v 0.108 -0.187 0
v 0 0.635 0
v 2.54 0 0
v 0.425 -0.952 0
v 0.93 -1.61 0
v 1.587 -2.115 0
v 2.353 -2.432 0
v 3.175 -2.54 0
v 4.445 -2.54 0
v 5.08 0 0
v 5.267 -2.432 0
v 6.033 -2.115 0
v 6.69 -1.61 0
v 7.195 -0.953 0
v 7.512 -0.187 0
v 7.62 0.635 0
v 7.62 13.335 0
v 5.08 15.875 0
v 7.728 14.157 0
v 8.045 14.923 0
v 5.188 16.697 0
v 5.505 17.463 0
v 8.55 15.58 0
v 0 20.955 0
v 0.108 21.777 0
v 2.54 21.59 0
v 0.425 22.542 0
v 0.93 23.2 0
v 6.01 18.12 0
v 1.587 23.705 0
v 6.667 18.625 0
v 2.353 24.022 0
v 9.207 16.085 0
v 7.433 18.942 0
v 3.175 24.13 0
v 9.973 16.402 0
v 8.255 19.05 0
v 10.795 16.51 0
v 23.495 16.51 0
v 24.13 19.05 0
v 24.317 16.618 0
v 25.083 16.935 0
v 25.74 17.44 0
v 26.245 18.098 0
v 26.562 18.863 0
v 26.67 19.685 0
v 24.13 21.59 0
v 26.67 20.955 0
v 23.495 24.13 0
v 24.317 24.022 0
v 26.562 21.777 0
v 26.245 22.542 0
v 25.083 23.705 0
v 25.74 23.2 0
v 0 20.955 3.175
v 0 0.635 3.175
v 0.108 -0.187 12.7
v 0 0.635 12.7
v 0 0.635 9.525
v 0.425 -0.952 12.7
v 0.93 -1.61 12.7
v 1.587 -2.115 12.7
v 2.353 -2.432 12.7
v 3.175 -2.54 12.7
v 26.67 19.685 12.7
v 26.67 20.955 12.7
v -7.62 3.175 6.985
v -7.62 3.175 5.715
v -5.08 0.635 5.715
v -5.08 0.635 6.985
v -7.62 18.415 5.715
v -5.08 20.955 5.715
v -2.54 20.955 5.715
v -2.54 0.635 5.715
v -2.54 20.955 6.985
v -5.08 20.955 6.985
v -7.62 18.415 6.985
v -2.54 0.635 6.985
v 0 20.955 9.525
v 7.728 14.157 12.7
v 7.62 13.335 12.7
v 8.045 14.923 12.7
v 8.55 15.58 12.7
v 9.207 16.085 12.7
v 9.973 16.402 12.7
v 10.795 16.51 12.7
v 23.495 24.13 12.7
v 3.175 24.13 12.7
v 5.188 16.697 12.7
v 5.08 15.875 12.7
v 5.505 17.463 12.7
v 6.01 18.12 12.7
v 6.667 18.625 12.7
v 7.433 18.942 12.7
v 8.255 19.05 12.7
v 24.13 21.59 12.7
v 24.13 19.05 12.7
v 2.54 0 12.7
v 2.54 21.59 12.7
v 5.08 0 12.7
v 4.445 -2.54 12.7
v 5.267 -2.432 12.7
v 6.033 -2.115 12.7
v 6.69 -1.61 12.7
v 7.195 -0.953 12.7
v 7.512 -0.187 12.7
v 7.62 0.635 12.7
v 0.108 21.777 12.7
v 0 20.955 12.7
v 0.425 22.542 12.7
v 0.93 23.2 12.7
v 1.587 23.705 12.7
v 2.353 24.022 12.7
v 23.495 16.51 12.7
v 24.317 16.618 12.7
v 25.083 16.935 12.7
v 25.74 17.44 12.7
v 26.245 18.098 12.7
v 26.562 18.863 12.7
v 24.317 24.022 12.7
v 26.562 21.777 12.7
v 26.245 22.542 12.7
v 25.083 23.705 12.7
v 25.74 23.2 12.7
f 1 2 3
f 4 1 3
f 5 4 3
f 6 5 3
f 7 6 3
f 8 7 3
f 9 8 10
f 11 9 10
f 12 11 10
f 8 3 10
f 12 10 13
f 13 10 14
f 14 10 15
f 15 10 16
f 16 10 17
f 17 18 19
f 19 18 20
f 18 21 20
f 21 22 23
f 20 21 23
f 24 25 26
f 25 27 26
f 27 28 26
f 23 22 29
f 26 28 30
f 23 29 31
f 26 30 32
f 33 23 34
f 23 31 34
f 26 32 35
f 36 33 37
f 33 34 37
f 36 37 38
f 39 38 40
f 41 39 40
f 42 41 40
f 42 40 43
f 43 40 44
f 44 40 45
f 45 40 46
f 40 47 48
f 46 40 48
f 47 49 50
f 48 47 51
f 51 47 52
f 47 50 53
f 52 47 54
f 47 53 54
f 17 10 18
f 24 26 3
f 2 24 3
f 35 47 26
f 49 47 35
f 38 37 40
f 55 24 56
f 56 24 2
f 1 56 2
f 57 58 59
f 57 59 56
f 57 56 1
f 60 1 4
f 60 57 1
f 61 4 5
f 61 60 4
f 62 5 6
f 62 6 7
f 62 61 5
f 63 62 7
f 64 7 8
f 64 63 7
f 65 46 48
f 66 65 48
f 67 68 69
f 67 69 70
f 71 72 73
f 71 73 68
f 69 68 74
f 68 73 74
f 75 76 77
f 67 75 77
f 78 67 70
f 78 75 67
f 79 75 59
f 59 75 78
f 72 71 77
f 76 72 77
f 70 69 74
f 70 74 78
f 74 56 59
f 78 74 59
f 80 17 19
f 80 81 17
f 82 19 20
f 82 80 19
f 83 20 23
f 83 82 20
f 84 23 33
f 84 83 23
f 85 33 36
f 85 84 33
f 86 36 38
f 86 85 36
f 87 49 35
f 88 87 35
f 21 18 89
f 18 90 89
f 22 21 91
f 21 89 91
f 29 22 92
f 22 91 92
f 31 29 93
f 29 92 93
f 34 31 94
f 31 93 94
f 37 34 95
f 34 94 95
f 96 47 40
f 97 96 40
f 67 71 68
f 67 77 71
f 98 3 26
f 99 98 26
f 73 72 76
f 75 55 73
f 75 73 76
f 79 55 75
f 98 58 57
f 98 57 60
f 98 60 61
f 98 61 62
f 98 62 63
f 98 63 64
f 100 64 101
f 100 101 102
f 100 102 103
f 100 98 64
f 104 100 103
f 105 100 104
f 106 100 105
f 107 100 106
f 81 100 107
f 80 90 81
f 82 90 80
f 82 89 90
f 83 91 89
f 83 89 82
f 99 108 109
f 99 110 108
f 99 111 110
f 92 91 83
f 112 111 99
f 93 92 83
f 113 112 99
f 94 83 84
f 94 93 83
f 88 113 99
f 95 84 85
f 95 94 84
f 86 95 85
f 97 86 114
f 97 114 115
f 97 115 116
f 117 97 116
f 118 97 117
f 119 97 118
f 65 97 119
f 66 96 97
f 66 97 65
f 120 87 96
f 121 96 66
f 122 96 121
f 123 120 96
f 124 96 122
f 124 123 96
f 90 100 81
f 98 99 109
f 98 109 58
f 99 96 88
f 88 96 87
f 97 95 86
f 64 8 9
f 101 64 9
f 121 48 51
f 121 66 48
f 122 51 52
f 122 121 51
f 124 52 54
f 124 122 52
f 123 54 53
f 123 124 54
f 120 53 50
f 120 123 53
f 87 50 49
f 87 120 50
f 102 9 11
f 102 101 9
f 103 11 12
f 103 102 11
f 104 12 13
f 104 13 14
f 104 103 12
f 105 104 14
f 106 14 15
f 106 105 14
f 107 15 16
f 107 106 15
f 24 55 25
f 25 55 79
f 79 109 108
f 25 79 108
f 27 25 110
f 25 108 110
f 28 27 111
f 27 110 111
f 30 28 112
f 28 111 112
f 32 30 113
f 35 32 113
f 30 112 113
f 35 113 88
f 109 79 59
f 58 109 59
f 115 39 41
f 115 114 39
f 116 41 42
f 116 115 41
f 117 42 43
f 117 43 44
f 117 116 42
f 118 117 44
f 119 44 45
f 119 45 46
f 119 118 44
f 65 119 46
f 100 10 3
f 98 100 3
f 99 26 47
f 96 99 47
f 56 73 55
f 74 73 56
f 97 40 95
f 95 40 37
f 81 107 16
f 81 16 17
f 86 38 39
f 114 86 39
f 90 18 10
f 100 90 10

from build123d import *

# Parameters (mm, degrees)
F1_DEPTH = 12.7
F2_R     = 3.175
F3_W     = 20.32
F3_H     = 1.27
F4_DEPTH = 7.62
F5_SIZE  = 2.54


with BuildPart() as f1:
    # F0 (on Top) → F1 (new body)
    with BuildSketch(Plane.XY):
        Polygon((0, 24.13), (0, -2.194877), (0, -2.54), (7.62, -2.54), (7.62, 16.51), (26.67, 16.51), (26.67, 24.13), align=None)
        Polygon((5.08, 0), (2.54, 0), (2.54, 21.59), (5.08, 21.59), (24.13, 21.59), (24.13, 19.05), (5.08, 19.05), align=None, mode=Mode.SUBTRACT)
    extrude(amount=F1_DEPTH)

    # F2
    f2_edges = [f1.edges().sort_by_distance(p)[0] for p in [
        (26.67, 24.13, 6.35),
        (26.67, 16.51, 6.35),
        (5.08, 19.05, 6.35),
        (0, 24.13, 6.35),
        (7.62, -2.54, 6.35),
        (0, -2.54, 6.35),
        (7.62, 16.51, 6.35),
    ]]
    fillet(f2_edges, radius=F2_R)

    # F3 (on face) → F4 (join)
    with BuildSketch(Plane(origin=(0, 0, 0), x_dir=(0, -1, 0), z_dir=(-1, 0, 0))):
        with Locations((-10.795, 6.35)):
            Rectangle(F3_W, F3_H)
    extrude(amount=F4_DEPTH)

    # F5
    f5_edges = [f1.edges().sort_by_distance(p)[0] for p in [
        (0, 10.795, 5.715),
        (0, 10.795, 6.985),
        (-7.62, 20.955, 6.35),
        (-7.62, 0.635, 6.35),
    ]]
    chamfer(f5_edges, length=F5_SIZE)


solid = f1.part
